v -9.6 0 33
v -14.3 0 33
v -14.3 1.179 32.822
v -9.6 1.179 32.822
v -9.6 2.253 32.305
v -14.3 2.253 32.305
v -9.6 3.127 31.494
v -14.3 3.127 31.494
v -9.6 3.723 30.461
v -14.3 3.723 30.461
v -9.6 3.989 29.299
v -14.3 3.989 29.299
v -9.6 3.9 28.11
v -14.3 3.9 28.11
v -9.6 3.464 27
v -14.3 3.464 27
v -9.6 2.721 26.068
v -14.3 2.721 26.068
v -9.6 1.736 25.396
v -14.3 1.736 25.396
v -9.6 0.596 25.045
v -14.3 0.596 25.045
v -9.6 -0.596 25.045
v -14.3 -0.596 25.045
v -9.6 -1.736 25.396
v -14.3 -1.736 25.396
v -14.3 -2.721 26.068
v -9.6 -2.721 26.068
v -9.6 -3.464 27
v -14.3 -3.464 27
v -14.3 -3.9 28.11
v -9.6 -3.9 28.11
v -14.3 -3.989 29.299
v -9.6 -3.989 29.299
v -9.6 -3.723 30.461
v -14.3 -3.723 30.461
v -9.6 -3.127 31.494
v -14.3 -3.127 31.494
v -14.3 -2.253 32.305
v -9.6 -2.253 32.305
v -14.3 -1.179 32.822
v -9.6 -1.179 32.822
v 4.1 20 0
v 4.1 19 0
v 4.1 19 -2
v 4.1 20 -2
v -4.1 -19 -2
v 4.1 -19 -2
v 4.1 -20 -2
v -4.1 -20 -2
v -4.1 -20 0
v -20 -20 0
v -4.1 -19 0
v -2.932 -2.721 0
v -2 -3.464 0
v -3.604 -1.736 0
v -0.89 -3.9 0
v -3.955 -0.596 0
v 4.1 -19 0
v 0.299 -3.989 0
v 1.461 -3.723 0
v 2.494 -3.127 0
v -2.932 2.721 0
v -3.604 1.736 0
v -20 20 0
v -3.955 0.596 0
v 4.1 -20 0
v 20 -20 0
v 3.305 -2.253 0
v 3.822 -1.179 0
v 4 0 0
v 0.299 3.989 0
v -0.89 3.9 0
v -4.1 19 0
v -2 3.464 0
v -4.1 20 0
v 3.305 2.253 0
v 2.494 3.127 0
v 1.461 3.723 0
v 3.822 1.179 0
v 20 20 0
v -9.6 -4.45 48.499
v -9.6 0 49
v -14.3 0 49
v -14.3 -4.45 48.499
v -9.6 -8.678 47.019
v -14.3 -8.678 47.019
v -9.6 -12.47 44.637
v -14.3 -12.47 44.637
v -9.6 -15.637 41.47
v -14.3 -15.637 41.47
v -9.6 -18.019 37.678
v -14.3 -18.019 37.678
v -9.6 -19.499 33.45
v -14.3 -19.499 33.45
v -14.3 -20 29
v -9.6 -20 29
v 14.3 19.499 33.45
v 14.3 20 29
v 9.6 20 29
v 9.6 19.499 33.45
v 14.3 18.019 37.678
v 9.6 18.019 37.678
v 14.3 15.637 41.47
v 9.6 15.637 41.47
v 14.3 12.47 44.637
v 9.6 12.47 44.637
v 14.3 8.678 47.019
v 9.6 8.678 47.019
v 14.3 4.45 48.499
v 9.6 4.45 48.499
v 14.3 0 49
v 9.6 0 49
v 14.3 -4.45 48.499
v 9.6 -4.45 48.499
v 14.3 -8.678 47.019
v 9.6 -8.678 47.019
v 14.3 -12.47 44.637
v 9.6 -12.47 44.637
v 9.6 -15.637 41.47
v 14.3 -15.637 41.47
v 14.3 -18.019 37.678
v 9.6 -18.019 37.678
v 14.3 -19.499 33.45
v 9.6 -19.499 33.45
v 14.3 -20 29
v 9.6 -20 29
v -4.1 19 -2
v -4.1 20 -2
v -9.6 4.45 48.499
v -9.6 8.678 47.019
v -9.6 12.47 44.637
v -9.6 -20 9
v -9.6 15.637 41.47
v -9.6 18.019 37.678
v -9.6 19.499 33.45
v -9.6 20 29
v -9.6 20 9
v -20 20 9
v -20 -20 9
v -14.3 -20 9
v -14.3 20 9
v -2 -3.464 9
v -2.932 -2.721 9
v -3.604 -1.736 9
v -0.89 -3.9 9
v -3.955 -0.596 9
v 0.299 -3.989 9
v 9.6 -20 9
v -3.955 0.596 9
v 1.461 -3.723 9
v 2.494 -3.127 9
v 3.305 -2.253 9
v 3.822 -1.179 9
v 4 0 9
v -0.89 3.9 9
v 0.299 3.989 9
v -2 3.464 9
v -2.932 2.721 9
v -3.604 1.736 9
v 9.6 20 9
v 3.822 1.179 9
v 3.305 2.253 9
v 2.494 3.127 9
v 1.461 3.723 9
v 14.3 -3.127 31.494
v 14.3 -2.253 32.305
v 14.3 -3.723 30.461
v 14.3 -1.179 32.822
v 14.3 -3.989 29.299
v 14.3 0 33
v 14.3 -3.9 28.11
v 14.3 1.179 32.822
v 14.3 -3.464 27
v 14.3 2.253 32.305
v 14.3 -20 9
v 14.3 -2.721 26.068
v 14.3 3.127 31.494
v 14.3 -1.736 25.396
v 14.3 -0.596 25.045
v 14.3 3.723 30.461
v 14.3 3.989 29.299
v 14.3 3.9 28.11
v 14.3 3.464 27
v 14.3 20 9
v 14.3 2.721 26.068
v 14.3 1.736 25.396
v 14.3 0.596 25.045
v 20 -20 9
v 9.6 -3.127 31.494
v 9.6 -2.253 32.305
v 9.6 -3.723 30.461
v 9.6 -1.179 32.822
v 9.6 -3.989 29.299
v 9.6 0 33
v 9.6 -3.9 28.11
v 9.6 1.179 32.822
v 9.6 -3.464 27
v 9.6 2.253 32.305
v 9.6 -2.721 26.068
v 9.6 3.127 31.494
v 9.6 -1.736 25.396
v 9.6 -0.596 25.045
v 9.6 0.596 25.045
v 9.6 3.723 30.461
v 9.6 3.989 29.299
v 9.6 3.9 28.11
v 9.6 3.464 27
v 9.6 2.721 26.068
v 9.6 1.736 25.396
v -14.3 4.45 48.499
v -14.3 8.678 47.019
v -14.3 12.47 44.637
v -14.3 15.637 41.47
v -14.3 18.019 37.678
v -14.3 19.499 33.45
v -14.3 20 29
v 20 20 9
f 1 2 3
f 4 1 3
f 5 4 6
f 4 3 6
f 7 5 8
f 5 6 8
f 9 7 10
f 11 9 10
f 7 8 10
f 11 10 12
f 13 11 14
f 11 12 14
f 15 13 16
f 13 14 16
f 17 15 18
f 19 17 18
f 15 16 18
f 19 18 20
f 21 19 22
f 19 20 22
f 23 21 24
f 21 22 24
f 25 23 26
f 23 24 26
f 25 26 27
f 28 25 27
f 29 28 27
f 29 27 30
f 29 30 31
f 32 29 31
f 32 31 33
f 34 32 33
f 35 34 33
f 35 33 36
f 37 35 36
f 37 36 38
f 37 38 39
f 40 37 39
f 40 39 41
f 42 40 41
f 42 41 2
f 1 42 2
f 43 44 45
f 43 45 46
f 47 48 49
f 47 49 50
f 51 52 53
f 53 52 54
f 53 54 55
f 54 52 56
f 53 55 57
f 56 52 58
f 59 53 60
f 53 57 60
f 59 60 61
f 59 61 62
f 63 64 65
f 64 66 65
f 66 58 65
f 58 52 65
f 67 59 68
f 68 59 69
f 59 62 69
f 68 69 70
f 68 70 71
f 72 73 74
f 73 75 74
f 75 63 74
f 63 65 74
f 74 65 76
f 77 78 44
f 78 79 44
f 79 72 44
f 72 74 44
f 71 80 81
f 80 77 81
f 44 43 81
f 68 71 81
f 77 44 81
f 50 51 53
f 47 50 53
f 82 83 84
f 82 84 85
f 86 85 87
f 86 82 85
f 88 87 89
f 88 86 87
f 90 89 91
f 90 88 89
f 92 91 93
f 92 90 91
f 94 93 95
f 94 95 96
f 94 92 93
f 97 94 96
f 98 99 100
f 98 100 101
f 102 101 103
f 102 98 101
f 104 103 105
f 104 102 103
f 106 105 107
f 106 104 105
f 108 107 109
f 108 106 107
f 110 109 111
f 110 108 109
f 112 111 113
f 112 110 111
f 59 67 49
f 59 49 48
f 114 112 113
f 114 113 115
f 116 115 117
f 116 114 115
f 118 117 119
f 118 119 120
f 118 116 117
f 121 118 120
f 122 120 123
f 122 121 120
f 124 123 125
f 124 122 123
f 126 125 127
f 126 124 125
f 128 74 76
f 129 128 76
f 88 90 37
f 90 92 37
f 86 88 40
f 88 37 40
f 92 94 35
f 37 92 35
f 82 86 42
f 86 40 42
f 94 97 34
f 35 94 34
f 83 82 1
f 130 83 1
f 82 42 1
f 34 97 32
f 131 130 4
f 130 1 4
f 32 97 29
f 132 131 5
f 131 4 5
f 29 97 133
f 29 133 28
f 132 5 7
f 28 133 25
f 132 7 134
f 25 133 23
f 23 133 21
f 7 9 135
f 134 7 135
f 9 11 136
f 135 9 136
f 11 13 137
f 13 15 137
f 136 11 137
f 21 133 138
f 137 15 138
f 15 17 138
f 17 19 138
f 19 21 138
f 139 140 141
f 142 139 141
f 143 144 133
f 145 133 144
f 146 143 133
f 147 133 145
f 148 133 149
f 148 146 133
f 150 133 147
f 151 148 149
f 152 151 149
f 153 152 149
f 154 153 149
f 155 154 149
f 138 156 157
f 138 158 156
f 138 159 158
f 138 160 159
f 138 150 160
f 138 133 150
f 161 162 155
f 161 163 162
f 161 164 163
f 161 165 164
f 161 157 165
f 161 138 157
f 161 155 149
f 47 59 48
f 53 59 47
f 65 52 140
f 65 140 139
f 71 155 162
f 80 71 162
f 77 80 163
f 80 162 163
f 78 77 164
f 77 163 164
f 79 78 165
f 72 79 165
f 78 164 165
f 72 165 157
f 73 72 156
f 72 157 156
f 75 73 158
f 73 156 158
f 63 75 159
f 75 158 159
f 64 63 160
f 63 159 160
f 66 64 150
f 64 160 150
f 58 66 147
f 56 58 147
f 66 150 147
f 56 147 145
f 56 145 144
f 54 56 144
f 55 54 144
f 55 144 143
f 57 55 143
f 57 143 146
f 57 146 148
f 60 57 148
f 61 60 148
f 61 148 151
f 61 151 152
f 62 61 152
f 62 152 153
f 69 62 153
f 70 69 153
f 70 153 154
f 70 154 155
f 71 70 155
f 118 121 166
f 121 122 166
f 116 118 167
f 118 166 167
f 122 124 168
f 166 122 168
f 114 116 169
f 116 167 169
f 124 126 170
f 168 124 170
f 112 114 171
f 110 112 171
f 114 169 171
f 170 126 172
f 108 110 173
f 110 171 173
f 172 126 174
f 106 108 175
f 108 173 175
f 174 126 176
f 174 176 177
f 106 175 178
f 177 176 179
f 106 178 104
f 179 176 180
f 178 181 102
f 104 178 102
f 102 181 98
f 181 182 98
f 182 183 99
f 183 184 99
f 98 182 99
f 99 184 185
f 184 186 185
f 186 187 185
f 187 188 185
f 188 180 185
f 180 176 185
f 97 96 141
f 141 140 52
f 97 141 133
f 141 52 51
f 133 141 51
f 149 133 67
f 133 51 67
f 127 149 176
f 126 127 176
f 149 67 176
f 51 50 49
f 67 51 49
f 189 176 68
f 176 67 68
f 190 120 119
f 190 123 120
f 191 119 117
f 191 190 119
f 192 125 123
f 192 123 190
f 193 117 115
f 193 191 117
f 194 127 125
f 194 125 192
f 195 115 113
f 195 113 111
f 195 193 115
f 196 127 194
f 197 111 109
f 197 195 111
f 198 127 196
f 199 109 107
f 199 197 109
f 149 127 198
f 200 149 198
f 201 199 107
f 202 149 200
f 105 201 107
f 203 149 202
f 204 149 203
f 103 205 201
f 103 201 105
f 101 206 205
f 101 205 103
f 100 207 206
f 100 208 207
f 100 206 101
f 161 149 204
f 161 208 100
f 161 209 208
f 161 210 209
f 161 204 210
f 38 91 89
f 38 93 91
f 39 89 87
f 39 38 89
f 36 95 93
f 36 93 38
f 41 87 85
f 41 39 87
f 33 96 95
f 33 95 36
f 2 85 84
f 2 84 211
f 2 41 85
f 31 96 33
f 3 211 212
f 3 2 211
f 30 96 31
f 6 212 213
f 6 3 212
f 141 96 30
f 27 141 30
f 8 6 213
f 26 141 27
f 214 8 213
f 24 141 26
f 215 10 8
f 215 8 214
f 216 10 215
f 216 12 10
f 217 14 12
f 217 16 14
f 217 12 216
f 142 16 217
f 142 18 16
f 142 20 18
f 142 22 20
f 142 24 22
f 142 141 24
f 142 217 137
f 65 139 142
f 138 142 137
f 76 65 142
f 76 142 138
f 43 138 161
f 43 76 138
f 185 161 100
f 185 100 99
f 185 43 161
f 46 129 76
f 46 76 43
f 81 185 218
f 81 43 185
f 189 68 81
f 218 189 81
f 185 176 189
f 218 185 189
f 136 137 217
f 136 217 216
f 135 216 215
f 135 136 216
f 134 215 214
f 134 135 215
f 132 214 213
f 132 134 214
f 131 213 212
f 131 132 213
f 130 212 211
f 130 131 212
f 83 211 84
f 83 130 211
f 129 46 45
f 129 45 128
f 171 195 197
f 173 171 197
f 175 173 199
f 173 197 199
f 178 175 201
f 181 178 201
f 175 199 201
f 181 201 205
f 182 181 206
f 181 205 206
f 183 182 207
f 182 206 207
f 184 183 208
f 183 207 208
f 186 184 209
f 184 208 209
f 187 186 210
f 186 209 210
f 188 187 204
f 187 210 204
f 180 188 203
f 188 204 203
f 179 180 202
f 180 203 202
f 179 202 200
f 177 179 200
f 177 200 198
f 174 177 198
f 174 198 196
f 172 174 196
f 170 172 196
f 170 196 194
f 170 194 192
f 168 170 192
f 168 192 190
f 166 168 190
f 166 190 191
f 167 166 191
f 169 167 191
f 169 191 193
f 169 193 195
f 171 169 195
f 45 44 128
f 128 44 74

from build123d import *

# Parameters (mm, degrees)
SKETCH_1_W          = 40
SKETCH_1_H          = 40
EXTRUDE_1_DEPTH     = 9
SKETCH_2_W          = 4.7
SKETCH_2_H          = 40
EXTRUDE_2_DEPTH     = 40
CUT_EXTRUDE_START   = -28.6
CUT_EXTRUDE_2_DEPTH = 28.6
SKETCH_4_R          = 4
CUT_EXTRUDE_3_DEPTH = 64.067344958
SKETCH_6_R          = 4
CUT_EXTRUDE_5_DEPTH = 49.989794856
SKETCH_7_W          = 8.2
SKETCH_7_H          = 1
EXTRUDE_3_DEPTH     = 2


# Read off the part's stored shape, not the designer's step: 切除-拉伸2
with BuildPart() as part:
    # 草图1 → 凸台-拉伸1 (new body)
    with BuildSketch(Plane.XY):
        Rectangle(SKETCH_1_W, SKETCH_1_H)
    extrude(amount=EXTRUDE_1_DEPTH)

    # 草图2 → 凸台-拉伸2 (add)
    with BuildSketch(Plane.XY.offset(9)):
        with Locations((-11.95, 0)):
            Rectangle(SKETCH_2_W, SKETCH_2_H)
        with Locations((11.95, 0)):
            Rectangle(SKETCH_2_W, SKETCH_2_H)
    extrude(amount=EXTRUDE_2_DEPTH)

    # 切除-拉伸2 outline → 切除-拉伸2 (cut)
    with BuildSketch(Plane.ZY.offset(14.3).offset(CUT_EXTRUDE_START)):
        with BuildLine():
            Line((49, 20), (29, 20))
            ThreePointArc((29, 20), (43.142135559, 14.142135688), (49, 1.83e-07))
            Line((49, 1.83e-07), (49, 20))
        make_face()
        with BuildLine():
            Line((49, -20), (49, 1.83e-07))
            ThreePointArc((49, 1.83e-07), (43.142135688, -14.142135559), (29, -20))
            Line((29, -20), (49, -20))
        make_face()
    extrude(amount=CUT_EXTRUDE_2_DEPTH, mode=Mode.SUBTRACT)

    # 草图4 → 切除-拉伸3 (cut, through all)
    with BuildSketch(Plane.ZY.offset(14.3)):
        with Locations((29, 0)):
            Circle(SKETCH_4_R)
    extrude(amount=-CUT_EXTRUDE_3_DEPTH, mode=Mode.SUBTRACT)

    # 草图6 → 切除-拉伸5 (cut, through all)
    with BuildSketch(Plane.XY.offset(9)):
        Circle(SKETCH_6_R)
    extrude(amount=-CUT_EXTRUDE_5_DEPTH, mode=Mode.SUBTRACT)

    # 草图7 → 凸台-拉伸3 (add)
    with BuildSketch(Plane(origin=(0, 0, 0), x_dir=(-1, 0, 0), z_dir=(0, 0, -1))):
        with Locations((0, 19.5)):
            Rectangle(SKETCH_7_W, SKETCH_7_H)
        with Locations((0, -19.5)):
            Rectangle(SKETCH_7_W, SKETCH_7_H)
    extrude(amount=EXTRUDE_3_DEPTH)


solid = part.part
